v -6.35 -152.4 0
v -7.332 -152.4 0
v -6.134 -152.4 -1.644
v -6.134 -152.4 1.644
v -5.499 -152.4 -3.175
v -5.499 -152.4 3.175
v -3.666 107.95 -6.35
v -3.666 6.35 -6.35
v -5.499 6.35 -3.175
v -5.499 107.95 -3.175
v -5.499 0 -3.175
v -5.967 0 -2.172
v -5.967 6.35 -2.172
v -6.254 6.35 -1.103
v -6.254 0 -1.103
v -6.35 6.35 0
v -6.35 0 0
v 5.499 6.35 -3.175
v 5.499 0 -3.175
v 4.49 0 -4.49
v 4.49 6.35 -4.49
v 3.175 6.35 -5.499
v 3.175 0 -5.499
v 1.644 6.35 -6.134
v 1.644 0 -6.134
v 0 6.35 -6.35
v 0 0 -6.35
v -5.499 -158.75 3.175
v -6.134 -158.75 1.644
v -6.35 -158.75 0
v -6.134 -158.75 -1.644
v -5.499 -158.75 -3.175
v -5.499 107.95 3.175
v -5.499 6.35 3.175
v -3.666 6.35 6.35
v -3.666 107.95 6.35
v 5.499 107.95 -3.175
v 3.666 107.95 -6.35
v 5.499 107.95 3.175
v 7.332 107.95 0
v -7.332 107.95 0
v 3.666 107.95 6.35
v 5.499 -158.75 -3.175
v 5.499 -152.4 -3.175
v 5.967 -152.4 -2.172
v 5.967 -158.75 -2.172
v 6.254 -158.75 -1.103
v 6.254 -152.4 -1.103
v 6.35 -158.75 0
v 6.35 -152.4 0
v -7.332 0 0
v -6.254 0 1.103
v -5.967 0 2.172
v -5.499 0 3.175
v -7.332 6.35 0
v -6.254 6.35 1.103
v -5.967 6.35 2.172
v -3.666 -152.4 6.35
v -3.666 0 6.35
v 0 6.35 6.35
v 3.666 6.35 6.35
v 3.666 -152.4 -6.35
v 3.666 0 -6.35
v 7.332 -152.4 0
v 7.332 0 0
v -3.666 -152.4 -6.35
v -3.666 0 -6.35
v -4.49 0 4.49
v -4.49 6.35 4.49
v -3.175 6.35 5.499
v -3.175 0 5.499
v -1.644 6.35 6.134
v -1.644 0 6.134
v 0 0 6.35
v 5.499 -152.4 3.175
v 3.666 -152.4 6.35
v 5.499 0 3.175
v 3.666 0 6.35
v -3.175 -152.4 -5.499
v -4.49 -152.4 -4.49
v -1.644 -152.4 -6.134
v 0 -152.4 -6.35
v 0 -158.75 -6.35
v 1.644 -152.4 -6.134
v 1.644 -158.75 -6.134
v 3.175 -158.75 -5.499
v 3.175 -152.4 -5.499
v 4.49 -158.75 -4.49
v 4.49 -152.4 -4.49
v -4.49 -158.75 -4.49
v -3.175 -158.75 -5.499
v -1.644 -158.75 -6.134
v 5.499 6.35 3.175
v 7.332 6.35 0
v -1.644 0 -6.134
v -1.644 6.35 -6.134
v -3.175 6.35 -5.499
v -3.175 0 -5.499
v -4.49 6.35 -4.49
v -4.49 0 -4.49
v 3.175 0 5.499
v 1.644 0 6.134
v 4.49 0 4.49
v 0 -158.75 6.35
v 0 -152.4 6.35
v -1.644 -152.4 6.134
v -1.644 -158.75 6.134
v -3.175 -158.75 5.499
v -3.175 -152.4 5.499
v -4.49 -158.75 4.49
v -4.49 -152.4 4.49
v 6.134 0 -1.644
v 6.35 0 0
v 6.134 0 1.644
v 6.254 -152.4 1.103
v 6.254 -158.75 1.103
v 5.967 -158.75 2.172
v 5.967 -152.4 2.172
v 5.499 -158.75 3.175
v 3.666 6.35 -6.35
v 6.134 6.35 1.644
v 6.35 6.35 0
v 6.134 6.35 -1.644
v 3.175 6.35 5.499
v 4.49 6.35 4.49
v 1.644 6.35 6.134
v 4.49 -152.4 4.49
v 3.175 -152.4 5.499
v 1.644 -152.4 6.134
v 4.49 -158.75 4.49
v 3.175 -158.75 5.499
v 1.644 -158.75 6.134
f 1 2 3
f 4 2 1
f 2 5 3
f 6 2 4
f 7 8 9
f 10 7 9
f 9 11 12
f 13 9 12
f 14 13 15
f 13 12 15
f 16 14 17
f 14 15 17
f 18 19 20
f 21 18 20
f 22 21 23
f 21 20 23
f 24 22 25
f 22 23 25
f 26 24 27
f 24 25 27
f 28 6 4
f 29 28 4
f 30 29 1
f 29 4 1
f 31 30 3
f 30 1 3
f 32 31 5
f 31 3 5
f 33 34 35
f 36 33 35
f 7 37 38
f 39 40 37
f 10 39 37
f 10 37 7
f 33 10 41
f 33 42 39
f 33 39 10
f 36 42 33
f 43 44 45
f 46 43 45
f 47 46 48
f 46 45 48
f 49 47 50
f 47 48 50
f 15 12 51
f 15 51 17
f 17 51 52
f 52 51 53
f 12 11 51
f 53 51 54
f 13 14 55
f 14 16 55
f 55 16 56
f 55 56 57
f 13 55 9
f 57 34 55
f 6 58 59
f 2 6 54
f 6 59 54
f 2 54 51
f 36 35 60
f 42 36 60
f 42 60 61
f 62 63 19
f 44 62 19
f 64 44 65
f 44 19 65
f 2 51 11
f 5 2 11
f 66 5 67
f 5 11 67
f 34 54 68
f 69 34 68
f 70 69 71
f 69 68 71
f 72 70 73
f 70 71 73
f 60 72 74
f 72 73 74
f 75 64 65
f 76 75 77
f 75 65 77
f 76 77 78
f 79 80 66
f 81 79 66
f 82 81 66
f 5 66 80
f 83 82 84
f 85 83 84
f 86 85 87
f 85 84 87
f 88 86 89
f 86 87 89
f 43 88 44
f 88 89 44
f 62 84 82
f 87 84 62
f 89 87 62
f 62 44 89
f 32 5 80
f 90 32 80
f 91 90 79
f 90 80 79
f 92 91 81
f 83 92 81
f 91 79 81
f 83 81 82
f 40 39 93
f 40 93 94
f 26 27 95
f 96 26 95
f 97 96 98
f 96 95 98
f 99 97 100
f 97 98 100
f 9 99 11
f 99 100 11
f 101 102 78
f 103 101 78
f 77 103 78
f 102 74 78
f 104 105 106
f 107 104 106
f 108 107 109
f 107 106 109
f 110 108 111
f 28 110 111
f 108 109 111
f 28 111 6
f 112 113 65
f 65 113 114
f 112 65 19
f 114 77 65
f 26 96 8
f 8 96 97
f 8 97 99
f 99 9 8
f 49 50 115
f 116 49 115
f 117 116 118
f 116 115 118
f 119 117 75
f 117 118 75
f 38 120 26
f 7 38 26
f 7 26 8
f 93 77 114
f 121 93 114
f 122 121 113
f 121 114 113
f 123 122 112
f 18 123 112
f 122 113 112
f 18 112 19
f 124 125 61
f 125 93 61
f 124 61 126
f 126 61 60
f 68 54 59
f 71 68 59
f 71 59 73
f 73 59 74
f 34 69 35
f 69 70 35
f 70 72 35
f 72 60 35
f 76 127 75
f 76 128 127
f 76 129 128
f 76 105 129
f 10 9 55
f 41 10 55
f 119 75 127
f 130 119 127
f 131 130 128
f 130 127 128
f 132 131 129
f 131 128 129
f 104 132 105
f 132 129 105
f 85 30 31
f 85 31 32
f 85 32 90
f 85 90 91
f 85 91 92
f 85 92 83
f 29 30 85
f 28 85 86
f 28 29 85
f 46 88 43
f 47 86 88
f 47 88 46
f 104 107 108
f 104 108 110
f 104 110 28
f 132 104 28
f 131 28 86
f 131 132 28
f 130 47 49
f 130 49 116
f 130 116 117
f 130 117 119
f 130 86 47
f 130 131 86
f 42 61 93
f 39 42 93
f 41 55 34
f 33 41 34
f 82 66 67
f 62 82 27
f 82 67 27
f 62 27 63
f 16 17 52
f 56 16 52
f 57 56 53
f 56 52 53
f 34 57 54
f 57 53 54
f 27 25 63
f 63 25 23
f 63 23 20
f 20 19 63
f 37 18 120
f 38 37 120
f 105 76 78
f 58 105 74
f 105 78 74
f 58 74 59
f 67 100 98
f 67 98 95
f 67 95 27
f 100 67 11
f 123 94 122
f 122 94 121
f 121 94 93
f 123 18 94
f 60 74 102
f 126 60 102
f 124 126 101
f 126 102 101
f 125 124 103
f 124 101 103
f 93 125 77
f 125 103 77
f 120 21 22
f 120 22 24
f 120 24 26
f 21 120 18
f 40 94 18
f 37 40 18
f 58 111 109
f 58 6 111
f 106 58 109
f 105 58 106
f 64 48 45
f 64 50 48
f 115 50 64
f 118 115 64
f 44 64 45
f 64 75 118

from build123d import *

# Parameters (mm, degrees)
F1_DEPTH = 152.4
F3_DEPTH = 6.35
F5_DEPTH = 6.35
F7_DEPTH = 101.6


with BuildPart() as f1:
    # F0 (on Front) → F1 (new body)
    with BuildSketch(Plane.XZ):
        Polygon((-3.6661742094, -6.35), (3.6661742094, -6.35), (7.3323484187, 0), (3.6661742094, 6.35), (-3.6661742094, 6.35), (-7.3323484187, 0), align=None)
    extrude(amount=F1_DEPTH)

    # F2 (on face) → F3 (join)
    with BuildSketch(Plane.XZ.offset(152.4)):
        with BuildLine():
            ThreePointArc((5.499261351, -3.174999936), (6.1336290065, -1.6435009007), (6.35, 0))
            ThreePointArc((6.35, 0), (6.133629012, 1.6435008802), (5.4992613723, 3.1749998991))
            ThreePointArc((5.4992613723, 3.1749998991), (3.1750000504, 5.4992612849), (0, 6.35))
            ThreePointArc((0, 6.35), (-3.1749999838, 5.4992613234), (-5.4992612953, 3.1750000324))
            ThreePointArc((-5.4992612953, 3.1750000324), (-6.35, 2.13e-08), (-5.4992613166, -3.1749999956))
            ThreePointArc((-5.4992613166, -3.1749999956), (-3.1750000022, -5.4992613128), (0, -6.35))
            ThreePointArc((0, -6.35), (3.175000032, -5.4992612955), (5.499261351, -3.174999936))
        make_face()
    extrude(amount=F3_DEPTH)

    # F4 (on face) → F5 (join)
    with BuildSketch(Plane(origin=(0, 0, 0), x_dir=(-1, 0, 0), z_dir=(0, 1, 0))):
        with BuildLine():
            ThreePointArc((5.4992613166, -3.1749999956), (6.1336289976, -1.6435009339), (6.35, 0))
            ThreePointArc((6.35, 0), (6.1336289972, 1.6435009354), (5.499261315, 3.1749999983))
            ThreePointArc((5.499261315, 3.1749999983), (3.1750000009, 5.4992613135), (0, 6.35))
            ThreePointArc((0, 6.35), (-3.174999954, 5.4992613406), (-5.4992612609, 3.175000092))
            ThreePointArc((-5.4992612609, 3.175000092), (-6.35, 7.29e-08), (-5.4992613338, -3.1749999658))
            ThreePointArc((-5.4992613338, -3.1749999658), (-3.1750000171, -5.4992613042), (0, -6.35))
            ThreePointArc((0, -6.35), (3.1750000022, -5.4992613128), (5.4992613166, -3.1749999956))
        make_face()
    extrude(amount=F5_DEPTH)

    # F6 (on face) → F7 (join)
    with BuildSketch(Plane(origin=(0, 6.35, 0), x_dir=(-1, 0, 0), z_dir=(0, 1, 0))):
        with BuildLine():
            ThreePointArc((-5.4992611496, -3.1750002849), (-3.1749998554, -5.4992613975), (5e-09, -6.35))
            ThreePointArc((5e-09, -6.35), (3.174999908, -5.4992613672), (5.4992612052, -3.1750001884))
            ThreePointArc((5.4992612052, -3.1750001884), (6.1336289688, -1.6435010415), (6.35, 0))
            ThreePointArc((6.35, 0), (6.1336289832, 1.6435009877), (5.4992612609, 3.175000092))
            ThreePointArc((5.4992612609, 3.175000092), (3.174999954, 5.4992613406), (0, 6.35))
            ThreePointArc((0, 6.35), (-3.1750000802, 5.4992612677), (-5.4992614067, 3.1749998395))
            ThreePointArc((-5.4992614067, 3.1749998395), (-6.35, -2.571e-07), (-5.4992611496, -3.1750002849))
        make_face()
        with BuildLine():
            Line((5e-09, -6.35), (3.6661742094, -6.35))
            Line((3.6661742094, -6.35), (5.4992612052, -3.1750001884))
            ThreePointArc((5.4992612052, -3.1750001884), (3.174999908, -5.4992613672), (5e-09, -6.35))
        make_face()
        with BuildLine():
            ThreePointArc((6.35, 0), (6.1336289688, -1.6435010415), (5.4992612052, -3.1750001884))
            Line((5.4992612052, -3.1750001884), (7.3323484187, 0))
            Line((7.3323484187, 0), (5.4992612609, 3.175000092))
            ThreePointArc((5.4992612609, 3.175000092), (6.1336289832, 1.6435009877), (6.35, 0))
        make_face()
        with BuildLine():
            ThreePointArc((0, 6.35), (3.174999954, 5.4992613406), (5.4992612609, 3.175000092))
            Line((5.4992612609, 3.175000092), (3.6661742094, 6.35))
            Line((3.6661742094, 6.35), (0, 6.35))
        make_face()
        with BuildLine():
            Line((-3.6661742094, 6.35), (-5.4992614067, 3.1749998395))
            ThreePointArc((-5.4992614067, 3.1749998395), (-3.1750000802, 5.4992612677), (0, 6.35))
            Line((0, 6.35), (-3.6661742094, 6.35))
        make_face()
        with BuildLine():
            Line((-7.3323484187, 0), (-5.4992611496, -3.1750002849))
            ThreePointArc((-5.4992611496, -3.1750002849), (-6.35, -2.571e-07), (-5.4992614067, 3.1749998395))
            Line((-5.4992614067, 3.1749998395), (-7.3323484187, 0))
        make_face()
        with BuildLine():
            Line((-3.6661742094, -6.35), (5e-09, -6.35))
            ThreePointArc((5e-09, -6.35), (-3.1749998554, -5.4992613975), (-5.4992611496, -3.1750002849))
            Line((-5.4992611496, -3.1750002849), (-3.6661742094, -6.35))
        make_face()
    extrude(amount=F7_DEPTH)


solid = f1.part
